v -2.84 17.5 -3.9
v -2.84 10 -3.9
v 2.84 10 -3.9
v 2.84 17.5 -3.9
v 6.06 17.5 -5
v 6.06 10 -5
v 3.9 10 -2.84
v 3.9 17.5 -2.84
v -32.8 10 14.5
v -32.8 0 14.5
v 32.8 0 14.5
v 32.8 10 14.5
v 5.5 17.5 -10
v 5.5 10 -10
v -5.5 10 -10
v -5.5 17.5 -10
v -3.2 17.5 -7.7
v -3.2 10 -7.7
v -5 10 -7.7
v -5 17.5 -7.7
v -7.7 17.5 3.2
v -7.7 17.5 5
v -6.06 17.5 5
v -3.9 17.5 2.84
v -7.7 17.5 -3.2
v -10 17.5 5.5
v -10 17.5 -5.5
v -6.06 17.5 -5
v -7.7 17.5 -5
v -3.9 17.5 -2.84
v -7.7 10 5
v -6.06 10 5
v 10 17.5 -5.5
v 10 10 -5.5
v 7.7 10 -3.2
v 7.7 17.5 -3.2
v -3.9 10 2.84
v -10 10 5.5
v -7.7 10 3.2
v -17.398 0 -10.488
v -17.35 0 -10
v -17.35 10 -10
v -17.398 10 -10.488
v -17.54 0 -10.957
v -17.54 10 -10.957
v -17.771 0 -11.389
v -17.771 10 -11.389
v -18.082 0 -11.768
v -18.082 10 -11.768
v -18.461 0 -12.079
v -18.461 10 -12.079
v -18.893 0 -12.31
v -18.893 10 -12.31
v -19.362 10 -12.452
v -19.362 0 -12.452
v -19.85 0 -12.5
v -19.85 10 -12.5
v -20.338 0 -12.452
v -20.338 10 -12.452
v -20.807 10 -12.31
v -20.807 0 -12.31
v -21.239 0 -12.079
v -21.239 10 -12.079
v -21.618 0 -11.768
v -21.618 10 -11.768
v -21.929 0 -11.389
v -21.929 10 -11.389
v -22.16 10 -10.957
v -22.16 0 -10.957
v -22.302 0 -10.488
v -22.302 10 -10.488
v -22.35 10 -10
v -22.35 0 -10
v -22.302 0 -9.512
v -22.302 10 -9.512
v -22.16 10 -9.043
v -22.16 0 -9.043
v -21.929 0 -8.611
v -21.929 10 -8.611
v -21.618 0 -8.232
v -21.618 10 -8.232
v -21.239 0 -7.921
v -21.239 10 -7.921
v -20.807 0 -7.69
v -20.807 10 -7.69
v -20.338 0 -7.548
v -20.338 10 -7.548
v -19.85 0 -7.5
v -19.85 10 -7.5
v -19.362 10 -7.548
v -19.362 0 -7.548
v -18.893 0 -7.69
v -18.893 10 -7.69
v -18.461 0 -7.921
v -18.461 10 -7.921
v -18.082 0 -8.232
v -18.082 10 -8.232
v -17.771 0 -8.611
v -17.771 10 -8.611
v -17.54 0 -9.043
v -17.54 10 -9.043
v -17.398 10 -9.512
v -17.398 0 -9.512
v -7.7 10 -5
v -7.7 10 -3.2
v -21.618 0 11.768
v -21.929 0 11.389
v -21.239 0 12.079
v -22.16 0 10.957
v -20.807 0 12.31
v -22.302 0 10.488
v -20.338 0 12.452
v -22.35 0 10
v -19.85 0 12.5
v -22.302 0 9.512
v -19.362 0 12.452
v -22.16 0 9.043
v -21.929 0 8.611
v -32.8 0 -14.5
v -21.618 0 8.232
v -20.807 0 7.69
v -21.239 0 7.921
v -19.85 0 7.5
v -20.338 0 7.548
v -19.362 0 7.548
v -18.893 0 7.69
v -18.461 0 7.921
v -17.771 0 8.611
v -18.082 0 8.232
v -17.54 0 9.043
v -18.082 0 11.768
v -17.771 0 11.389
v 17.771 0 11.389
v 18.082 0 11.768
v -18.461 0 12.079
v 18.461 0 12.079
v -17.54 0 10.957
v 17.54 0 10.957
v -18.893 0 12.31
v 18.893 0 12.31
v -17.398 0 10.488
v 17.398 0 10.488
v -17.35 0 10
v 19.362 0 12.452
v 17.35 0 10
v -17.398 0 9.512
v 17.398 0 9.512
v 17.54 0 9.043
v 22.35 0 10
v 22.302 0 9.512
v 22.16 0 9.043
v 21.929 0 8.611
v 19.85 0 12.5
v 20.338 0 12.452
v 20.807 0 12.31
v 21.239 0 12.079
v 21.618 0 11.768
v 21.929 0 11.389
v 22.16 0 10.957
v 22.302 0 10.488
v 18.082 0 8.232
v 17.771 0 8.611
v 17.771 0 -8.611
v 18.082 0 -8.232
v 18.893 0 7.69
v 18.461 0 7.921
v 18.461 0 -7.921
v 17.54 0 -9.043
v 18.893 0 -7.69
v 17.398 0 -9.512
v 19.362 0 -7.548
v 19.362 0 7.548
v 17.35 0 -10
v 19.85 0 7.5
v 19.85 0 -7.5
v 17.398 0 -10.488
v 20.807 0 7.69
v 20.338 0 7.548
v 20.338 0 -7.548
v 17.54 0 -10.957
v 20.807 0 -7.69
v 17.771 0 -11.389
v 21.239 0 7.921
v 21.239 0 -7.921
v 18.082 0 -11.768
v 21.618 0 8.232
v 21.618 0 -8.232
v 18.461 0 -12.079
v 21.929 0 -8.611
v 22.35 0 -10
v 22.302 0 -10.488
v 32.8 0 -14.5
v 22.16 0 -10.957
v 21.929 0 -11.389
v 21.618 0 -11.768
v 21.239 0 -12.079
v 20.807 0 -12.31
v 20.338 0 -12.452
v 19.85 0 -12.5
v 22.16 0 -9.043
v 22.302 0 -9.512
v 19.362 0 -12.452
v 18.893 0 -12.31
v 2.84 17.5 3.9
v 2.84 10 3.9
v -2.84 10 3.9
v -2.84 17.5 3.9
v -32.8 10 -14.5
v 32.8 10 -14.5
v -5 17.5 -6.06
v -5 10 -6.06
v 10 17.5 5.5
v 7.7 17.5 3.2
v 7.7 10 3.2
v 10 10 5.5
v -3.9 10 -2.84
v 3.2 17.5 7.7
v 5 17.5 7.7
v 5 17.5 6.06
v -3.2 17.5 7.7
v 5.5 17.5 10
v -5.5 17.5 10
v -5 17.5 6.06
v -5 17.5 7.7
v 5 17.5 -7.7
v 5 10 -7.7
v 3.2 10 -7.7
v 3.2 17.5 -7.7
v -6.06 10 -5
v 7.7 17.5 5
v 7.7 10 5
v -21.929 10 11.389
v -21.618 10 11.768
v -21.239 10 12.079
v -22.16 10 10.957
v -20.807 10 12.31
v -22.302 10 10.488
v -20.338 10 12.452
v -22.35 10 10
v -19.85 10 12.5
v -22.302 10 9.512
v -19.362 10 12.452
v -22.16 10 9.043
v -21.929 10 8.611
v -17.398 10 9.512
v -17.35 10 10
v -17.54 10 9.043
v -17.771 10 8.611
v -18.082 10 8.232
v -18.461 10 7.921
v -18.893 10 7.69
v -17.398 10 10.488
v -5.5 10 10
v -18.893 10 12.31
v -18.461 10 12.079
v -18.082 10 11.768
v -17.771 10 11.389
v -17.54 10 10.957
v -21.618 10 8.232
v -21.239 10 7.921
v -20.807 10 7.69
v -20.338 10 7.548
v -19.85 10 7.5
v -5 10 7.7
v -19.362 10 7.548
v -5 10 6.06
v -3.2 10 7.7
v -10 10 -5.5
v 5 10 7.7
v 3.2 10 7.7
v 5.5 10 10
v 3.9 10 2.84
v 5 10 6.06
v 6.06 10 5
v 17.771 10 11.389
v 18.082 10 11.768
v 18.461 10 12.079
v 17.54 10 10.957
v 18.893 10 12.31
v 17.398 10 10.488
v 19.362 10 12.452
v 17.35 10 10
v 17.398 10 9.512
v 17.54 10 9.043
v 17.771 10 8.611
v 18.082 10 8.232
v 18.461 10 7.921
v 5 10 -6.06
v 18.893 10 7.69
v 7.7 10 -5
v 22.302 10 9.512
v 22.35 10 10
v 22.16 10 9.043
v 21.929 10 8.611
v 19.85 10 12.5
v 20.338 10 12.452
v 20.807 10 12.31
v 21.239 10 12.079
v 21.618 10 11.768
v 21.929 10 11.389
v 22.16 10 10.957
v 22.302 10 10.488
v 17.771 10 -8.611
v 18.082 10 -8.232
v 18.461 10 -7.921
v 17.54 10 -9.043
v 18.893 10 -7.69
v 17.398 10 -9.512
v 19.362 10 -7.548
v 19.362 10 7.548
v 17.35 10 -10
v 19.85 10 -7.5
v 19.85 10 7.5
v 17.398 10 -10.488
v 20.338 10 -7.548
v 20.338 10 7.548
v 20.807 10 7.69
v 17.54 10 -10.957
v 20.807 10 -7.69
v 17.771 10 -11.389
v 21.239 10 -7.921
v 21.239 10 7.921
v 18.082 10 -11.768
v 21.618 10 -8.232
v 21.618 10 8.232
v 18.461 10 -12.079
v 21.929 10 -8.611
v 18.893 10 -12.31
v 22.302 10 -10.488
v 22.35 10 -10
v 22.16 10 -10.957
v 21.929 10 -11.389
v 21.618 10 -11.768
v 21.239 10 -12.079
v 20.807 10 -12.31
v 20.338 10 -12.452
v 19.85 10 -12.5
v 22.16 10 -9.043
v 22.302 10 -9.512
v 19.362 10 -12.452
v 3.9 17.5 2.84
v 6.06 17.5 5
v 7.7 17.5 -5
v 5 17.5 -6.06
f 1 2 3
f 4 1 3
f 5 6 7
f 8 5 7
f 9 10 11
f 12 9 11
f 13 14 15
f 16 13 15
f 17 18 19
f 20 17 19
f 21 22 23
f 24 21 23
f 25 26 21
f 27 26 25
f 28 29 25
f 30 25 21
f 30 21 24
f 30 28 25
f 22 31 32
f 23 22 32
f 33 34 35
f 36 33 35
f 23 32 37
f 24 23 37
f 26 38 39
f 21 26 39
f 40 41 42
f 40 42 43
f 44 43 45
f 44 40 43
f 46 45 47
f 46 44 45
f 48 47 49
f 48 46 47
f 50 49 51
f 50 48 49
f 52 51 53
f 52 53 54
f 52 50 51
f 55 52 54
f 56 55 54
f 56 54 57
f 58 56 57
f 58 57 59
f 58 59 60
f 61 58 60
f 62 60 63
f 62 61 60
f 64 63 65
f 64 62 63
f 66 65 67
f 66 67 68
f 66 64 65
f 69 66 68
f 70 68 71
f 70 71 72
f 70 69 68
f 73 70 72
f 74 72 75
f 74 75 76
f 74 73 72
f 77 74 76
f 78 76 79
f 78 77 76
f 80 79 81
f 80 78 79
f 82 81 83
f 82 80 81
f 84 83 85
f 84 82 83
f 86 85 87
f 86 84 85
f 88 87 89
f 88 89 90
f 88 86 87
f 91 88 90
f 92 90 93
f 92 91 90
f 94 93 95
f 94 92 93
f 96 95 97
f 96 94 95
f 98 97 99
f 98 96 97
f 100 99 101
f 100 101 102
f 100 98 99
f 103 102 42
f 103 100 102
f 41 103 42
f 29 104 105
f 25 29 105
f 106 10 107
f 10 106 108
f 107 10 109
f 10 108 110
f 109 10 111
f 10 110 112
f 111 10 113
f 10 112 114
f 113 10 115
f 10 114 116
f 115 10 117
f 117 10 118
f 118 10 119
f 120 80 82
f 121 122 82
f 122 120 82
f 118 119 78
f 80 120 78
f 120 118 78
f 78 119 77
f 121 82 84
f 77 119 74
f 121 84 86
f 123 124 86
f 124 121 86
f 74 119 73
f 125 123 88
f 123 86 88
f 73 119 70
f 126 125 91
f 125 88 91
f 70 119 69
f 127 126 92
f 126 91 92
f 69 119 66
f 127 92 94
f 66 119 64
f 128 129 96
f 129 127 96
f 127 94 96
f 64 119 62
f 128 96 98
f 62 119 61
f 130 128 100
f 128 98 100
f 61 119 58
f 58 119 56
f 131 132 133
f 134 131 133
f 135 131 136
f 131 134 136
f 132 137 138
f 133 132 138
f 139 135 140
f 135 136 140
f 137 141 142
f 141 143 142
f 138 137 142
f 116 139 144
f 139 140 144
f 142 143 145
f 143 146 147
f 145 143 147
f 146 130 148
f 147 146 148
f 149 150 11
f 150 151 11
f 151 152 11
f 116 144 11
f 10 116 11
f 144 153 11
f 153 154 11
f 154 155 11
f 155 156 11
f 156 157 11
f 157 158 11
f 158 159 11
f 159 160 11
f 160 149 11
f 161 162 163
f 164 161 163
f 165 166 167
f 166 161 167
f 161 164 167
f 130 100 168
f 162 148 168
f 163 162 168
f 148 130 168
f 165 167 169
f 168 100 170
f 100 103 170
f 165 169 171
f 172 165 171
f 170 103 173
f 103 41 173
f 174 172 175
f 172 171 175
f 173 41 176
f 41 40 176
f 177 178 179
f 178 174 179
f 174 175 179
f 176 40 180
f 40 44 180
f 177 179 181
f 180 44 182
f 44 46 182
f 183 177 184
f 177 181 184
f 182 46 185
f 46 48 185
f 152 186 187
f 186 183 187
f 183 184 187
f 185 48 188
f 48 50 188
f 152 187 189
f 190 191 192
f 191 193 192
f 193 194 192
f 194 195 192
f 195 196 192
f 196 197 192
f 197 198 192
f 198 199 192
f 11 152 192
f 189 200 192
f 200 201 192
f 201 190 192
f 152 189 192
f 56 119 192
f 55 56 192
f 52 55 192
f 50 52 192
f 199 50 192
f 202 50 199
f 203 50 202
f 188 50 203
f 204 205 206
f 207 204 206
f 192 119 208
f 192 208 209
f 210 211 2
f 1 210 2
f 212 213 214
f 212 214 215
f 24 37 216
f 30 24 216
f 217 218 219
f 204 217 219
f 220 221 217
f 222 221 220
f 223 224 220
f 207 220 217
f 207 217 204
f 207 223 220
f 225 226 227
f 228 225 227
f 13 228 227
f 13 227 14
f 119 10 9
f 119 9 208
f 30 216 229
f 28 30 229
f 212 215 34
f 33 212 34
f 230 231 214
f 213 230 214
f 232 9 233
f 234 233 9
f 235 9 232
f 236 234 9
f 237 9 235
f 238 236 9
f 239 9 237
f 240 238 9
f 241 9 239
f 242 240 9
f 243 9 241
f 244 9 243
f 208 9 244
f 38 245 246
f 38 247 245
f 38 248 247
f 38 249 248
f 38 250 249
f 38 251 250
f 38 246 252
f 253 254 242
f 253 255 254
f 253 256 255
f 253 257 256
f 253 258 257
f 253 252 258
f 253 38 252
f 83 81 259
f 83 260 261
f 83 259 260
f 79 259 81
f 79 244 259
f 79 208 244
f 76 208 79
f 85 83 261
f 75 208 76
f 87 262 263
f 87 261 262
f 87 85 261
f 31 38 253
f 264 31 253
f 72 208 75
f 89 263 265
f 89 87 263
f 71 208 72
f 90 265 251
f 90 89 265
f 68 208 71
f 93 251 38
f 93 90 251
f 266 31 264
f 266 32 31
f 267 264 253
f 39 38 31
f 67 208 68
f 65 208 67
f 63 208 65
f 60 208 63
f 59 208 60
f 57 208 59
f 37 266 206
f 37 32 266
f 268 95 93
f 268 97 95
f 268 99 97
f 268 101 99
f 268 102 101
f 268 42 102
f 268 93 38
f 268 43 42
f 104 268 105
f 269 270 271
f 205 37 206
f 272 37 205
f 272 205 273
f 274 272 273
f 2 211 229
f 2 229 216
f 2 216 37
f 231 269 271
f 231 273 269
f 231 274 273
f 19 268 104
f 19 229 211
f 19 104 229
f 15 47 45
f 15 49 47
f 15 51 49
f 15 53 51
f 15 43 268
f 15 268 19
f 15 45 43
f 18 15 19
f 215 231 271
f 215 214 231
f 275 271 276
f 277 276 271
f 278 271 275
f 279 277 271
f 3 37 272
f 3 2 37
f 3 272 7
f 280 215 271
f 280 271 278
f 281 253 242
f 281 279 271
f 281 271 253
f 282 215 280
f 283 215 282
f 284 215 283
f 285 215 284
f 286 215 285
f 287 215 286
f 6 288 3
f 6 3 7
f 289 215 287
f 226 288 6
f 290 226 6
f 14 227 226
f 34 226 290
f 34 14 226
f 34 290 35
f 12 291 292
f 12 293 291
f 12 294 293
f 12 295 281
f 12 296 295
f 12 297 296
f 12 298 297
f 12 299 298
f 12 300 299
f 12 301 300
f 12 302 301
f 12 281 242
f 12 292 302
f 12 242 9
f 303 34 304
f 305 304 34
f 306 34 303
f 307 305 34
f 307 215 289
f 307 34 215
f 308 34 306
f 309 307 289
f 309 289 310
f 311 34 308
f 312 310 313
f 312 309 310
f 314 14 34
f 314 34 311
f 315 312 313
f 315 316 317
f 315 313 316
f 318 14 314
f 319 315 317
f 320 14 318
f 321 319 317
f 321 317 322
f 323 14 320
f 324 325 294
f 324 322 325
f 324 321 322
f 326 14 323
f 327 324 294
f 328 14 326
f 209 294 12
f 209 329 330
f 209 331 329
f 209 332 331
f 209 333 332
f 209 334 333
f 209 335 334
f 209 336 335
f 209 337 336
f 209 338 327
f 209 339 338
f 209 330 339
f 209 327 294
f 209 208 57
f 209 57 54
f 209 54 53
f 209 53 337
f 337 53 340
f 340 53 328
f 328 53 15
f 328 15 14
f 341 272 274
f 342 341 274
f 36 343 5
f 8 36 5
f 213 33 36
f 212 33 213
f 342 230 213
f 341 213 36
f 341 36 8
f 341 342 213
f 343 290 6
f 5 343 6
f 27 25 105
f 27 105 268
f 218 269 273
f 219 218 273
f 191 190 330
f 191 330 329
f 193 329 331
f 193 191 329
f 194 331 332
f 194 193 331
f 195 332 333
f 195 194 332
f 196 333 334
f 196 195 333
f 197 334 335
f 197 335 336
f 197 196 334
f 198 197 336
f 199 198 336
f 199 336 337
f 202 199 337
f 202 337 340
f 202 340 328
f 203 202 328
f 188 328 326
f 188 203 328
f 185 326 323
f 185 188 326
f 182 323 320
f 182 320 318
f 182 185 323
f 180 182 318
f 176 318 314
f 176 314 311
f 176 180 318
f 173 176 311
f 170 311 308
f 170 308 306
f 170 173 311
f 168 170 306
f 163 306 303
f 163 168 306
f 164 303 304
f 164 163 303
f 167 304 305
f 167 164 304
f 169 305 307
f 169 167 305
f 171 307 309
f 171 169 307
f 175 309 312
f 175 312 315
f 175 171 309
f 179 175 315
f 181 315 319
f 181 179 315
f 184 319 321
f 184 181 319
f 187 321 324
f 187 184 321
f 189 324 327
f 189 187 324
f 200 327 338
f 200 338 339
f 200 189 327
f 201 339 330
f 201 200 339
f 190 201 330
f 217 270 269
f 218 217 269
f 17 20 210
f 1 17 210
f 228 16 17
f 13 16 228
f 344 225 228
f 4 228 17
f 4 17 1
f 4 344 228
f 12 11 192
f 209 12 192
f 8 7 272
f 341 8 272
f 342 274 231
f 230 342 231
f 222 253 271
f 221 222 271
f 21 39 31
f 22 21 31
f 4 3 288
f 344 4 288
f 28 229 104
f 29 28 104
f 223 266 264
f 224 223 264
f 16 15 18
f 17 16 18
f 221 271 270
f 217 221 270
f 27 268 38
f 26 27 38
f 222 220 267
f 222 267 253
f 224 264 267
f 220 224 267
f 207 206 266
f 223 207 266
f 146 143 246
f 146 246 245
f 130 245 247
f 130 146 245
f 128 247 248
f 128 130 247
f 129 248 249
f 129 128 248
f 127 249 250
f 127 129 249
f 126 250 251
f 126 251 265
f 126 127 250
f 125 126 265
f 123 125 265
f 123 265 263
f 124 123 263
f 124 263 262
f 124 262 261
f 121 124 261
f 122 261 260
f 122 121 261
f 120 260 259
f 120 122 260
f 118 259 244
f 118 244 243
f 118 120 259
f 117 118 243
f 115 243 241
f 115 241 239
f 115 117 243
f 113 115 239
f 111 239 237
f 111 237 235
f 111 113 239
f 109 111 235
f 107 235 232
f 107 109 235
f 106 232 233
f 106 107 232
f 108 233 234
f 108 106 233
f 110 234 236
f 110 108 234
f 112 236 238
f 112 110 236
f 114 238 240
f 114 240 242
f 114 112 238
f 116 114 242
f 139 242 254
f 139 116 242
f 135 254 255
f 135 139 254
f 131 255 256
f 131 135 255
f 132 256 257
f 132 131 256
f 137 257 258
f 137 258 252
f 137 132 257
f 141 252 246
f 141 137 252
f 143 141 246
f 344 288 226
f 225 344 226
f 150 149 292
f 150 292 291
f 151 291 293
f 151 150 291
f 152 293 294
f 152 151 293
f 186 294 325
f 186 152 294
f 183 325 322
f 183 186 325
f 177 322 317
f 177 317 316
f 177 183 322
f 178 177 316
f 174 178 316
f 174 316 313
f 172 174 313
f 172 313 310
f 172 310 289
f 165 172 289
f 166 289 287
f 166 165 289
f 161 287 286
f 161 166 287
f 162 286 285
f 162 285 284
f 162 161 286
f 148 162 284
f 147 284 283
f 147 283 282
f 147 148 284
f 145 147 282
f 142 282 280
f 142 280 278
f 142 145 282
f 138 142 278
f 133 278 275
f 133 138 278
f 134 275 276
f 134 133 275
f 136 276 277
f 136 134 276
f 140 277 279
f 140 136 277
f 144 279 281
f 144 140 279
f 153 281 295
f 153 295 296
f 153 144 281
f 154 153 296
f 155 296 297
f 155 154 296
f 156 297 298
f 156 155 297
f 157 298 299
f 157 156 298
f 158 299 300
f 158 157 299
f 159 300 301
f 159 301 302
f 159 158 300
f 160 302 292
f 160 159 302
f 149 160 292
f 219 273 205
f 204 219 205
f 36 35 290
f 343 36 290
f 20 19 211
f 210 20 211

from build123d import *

# Parameters (mm, degrees)
SKETCH1_W           = 65.6
SKETCH1_H           = 29
SKETCH1_R           = 2.5
BOSS_EXTRUDE1_DEPTH = 10
BOSS_EXTRUDE2_DEPTH = 7.5
CIRPATTERN1_COUNT   = 4


with BuildPart() as part:
    # Sketch1 → Boss-Extrude1 (new body)
    with BuildSketch(Plane(origin=(0, 0, 0), x_dir=(1, 0, 0), z_dir=(0, 1, 0))):
        Rectangle(SKETCH1_W, SKETCH1_H)
        with Locations((-19.85, 10)):
            Circle(SKETCH1_R, mode=Mode.SUBTRACT)
        with Locations((19.85, 10)):
            Circle(SKETCH1_R, mode=Mode.SUBTRACT)
        with Locations((19.85, -10)):
            Circle(SKETCH1_R, mode=Mode.SUBTRACT)
        with Locations((-19.85, -10)):
            Circle(SKETCH1_R, mode=Mode.SUBTRACT)
    extrude(amount=BOSS_EXTRUDE1_DEPTH)

    # Sketch2 → Boss-Extrude2 (add)
    with BuildSketch(Plane(origin=(0, 10, 0), x_dir=(1, 0, 0), z_dir=(0, 1, 0))):
        Polygon((-10, 5.5), (-10, -5.5), (-7.7, -3.2), (-7.7, -5), (-6.06, -5), (-3.9, -2.84), (-3.9, 2.84), (-6.06, 5), (-7.7, 5), (-7.7, 3.2), align=None)
    boss_extrude2 = extrude(amount=BOSS_EXTRUDE2_DEPTH)

    # CirPattern1: Boss-Extrude2 ×4 about axis
    cirpattern1_axis = Axis((0, -0.5, 0), (0, 1, 0))
    for i in range(1, CIRPATTERN1_COUNT):
        add(boss_extrude2.rotate(cirpattern1_axis, i * 360 / CIRPATTERN1_COUNT))


solid = part.part
